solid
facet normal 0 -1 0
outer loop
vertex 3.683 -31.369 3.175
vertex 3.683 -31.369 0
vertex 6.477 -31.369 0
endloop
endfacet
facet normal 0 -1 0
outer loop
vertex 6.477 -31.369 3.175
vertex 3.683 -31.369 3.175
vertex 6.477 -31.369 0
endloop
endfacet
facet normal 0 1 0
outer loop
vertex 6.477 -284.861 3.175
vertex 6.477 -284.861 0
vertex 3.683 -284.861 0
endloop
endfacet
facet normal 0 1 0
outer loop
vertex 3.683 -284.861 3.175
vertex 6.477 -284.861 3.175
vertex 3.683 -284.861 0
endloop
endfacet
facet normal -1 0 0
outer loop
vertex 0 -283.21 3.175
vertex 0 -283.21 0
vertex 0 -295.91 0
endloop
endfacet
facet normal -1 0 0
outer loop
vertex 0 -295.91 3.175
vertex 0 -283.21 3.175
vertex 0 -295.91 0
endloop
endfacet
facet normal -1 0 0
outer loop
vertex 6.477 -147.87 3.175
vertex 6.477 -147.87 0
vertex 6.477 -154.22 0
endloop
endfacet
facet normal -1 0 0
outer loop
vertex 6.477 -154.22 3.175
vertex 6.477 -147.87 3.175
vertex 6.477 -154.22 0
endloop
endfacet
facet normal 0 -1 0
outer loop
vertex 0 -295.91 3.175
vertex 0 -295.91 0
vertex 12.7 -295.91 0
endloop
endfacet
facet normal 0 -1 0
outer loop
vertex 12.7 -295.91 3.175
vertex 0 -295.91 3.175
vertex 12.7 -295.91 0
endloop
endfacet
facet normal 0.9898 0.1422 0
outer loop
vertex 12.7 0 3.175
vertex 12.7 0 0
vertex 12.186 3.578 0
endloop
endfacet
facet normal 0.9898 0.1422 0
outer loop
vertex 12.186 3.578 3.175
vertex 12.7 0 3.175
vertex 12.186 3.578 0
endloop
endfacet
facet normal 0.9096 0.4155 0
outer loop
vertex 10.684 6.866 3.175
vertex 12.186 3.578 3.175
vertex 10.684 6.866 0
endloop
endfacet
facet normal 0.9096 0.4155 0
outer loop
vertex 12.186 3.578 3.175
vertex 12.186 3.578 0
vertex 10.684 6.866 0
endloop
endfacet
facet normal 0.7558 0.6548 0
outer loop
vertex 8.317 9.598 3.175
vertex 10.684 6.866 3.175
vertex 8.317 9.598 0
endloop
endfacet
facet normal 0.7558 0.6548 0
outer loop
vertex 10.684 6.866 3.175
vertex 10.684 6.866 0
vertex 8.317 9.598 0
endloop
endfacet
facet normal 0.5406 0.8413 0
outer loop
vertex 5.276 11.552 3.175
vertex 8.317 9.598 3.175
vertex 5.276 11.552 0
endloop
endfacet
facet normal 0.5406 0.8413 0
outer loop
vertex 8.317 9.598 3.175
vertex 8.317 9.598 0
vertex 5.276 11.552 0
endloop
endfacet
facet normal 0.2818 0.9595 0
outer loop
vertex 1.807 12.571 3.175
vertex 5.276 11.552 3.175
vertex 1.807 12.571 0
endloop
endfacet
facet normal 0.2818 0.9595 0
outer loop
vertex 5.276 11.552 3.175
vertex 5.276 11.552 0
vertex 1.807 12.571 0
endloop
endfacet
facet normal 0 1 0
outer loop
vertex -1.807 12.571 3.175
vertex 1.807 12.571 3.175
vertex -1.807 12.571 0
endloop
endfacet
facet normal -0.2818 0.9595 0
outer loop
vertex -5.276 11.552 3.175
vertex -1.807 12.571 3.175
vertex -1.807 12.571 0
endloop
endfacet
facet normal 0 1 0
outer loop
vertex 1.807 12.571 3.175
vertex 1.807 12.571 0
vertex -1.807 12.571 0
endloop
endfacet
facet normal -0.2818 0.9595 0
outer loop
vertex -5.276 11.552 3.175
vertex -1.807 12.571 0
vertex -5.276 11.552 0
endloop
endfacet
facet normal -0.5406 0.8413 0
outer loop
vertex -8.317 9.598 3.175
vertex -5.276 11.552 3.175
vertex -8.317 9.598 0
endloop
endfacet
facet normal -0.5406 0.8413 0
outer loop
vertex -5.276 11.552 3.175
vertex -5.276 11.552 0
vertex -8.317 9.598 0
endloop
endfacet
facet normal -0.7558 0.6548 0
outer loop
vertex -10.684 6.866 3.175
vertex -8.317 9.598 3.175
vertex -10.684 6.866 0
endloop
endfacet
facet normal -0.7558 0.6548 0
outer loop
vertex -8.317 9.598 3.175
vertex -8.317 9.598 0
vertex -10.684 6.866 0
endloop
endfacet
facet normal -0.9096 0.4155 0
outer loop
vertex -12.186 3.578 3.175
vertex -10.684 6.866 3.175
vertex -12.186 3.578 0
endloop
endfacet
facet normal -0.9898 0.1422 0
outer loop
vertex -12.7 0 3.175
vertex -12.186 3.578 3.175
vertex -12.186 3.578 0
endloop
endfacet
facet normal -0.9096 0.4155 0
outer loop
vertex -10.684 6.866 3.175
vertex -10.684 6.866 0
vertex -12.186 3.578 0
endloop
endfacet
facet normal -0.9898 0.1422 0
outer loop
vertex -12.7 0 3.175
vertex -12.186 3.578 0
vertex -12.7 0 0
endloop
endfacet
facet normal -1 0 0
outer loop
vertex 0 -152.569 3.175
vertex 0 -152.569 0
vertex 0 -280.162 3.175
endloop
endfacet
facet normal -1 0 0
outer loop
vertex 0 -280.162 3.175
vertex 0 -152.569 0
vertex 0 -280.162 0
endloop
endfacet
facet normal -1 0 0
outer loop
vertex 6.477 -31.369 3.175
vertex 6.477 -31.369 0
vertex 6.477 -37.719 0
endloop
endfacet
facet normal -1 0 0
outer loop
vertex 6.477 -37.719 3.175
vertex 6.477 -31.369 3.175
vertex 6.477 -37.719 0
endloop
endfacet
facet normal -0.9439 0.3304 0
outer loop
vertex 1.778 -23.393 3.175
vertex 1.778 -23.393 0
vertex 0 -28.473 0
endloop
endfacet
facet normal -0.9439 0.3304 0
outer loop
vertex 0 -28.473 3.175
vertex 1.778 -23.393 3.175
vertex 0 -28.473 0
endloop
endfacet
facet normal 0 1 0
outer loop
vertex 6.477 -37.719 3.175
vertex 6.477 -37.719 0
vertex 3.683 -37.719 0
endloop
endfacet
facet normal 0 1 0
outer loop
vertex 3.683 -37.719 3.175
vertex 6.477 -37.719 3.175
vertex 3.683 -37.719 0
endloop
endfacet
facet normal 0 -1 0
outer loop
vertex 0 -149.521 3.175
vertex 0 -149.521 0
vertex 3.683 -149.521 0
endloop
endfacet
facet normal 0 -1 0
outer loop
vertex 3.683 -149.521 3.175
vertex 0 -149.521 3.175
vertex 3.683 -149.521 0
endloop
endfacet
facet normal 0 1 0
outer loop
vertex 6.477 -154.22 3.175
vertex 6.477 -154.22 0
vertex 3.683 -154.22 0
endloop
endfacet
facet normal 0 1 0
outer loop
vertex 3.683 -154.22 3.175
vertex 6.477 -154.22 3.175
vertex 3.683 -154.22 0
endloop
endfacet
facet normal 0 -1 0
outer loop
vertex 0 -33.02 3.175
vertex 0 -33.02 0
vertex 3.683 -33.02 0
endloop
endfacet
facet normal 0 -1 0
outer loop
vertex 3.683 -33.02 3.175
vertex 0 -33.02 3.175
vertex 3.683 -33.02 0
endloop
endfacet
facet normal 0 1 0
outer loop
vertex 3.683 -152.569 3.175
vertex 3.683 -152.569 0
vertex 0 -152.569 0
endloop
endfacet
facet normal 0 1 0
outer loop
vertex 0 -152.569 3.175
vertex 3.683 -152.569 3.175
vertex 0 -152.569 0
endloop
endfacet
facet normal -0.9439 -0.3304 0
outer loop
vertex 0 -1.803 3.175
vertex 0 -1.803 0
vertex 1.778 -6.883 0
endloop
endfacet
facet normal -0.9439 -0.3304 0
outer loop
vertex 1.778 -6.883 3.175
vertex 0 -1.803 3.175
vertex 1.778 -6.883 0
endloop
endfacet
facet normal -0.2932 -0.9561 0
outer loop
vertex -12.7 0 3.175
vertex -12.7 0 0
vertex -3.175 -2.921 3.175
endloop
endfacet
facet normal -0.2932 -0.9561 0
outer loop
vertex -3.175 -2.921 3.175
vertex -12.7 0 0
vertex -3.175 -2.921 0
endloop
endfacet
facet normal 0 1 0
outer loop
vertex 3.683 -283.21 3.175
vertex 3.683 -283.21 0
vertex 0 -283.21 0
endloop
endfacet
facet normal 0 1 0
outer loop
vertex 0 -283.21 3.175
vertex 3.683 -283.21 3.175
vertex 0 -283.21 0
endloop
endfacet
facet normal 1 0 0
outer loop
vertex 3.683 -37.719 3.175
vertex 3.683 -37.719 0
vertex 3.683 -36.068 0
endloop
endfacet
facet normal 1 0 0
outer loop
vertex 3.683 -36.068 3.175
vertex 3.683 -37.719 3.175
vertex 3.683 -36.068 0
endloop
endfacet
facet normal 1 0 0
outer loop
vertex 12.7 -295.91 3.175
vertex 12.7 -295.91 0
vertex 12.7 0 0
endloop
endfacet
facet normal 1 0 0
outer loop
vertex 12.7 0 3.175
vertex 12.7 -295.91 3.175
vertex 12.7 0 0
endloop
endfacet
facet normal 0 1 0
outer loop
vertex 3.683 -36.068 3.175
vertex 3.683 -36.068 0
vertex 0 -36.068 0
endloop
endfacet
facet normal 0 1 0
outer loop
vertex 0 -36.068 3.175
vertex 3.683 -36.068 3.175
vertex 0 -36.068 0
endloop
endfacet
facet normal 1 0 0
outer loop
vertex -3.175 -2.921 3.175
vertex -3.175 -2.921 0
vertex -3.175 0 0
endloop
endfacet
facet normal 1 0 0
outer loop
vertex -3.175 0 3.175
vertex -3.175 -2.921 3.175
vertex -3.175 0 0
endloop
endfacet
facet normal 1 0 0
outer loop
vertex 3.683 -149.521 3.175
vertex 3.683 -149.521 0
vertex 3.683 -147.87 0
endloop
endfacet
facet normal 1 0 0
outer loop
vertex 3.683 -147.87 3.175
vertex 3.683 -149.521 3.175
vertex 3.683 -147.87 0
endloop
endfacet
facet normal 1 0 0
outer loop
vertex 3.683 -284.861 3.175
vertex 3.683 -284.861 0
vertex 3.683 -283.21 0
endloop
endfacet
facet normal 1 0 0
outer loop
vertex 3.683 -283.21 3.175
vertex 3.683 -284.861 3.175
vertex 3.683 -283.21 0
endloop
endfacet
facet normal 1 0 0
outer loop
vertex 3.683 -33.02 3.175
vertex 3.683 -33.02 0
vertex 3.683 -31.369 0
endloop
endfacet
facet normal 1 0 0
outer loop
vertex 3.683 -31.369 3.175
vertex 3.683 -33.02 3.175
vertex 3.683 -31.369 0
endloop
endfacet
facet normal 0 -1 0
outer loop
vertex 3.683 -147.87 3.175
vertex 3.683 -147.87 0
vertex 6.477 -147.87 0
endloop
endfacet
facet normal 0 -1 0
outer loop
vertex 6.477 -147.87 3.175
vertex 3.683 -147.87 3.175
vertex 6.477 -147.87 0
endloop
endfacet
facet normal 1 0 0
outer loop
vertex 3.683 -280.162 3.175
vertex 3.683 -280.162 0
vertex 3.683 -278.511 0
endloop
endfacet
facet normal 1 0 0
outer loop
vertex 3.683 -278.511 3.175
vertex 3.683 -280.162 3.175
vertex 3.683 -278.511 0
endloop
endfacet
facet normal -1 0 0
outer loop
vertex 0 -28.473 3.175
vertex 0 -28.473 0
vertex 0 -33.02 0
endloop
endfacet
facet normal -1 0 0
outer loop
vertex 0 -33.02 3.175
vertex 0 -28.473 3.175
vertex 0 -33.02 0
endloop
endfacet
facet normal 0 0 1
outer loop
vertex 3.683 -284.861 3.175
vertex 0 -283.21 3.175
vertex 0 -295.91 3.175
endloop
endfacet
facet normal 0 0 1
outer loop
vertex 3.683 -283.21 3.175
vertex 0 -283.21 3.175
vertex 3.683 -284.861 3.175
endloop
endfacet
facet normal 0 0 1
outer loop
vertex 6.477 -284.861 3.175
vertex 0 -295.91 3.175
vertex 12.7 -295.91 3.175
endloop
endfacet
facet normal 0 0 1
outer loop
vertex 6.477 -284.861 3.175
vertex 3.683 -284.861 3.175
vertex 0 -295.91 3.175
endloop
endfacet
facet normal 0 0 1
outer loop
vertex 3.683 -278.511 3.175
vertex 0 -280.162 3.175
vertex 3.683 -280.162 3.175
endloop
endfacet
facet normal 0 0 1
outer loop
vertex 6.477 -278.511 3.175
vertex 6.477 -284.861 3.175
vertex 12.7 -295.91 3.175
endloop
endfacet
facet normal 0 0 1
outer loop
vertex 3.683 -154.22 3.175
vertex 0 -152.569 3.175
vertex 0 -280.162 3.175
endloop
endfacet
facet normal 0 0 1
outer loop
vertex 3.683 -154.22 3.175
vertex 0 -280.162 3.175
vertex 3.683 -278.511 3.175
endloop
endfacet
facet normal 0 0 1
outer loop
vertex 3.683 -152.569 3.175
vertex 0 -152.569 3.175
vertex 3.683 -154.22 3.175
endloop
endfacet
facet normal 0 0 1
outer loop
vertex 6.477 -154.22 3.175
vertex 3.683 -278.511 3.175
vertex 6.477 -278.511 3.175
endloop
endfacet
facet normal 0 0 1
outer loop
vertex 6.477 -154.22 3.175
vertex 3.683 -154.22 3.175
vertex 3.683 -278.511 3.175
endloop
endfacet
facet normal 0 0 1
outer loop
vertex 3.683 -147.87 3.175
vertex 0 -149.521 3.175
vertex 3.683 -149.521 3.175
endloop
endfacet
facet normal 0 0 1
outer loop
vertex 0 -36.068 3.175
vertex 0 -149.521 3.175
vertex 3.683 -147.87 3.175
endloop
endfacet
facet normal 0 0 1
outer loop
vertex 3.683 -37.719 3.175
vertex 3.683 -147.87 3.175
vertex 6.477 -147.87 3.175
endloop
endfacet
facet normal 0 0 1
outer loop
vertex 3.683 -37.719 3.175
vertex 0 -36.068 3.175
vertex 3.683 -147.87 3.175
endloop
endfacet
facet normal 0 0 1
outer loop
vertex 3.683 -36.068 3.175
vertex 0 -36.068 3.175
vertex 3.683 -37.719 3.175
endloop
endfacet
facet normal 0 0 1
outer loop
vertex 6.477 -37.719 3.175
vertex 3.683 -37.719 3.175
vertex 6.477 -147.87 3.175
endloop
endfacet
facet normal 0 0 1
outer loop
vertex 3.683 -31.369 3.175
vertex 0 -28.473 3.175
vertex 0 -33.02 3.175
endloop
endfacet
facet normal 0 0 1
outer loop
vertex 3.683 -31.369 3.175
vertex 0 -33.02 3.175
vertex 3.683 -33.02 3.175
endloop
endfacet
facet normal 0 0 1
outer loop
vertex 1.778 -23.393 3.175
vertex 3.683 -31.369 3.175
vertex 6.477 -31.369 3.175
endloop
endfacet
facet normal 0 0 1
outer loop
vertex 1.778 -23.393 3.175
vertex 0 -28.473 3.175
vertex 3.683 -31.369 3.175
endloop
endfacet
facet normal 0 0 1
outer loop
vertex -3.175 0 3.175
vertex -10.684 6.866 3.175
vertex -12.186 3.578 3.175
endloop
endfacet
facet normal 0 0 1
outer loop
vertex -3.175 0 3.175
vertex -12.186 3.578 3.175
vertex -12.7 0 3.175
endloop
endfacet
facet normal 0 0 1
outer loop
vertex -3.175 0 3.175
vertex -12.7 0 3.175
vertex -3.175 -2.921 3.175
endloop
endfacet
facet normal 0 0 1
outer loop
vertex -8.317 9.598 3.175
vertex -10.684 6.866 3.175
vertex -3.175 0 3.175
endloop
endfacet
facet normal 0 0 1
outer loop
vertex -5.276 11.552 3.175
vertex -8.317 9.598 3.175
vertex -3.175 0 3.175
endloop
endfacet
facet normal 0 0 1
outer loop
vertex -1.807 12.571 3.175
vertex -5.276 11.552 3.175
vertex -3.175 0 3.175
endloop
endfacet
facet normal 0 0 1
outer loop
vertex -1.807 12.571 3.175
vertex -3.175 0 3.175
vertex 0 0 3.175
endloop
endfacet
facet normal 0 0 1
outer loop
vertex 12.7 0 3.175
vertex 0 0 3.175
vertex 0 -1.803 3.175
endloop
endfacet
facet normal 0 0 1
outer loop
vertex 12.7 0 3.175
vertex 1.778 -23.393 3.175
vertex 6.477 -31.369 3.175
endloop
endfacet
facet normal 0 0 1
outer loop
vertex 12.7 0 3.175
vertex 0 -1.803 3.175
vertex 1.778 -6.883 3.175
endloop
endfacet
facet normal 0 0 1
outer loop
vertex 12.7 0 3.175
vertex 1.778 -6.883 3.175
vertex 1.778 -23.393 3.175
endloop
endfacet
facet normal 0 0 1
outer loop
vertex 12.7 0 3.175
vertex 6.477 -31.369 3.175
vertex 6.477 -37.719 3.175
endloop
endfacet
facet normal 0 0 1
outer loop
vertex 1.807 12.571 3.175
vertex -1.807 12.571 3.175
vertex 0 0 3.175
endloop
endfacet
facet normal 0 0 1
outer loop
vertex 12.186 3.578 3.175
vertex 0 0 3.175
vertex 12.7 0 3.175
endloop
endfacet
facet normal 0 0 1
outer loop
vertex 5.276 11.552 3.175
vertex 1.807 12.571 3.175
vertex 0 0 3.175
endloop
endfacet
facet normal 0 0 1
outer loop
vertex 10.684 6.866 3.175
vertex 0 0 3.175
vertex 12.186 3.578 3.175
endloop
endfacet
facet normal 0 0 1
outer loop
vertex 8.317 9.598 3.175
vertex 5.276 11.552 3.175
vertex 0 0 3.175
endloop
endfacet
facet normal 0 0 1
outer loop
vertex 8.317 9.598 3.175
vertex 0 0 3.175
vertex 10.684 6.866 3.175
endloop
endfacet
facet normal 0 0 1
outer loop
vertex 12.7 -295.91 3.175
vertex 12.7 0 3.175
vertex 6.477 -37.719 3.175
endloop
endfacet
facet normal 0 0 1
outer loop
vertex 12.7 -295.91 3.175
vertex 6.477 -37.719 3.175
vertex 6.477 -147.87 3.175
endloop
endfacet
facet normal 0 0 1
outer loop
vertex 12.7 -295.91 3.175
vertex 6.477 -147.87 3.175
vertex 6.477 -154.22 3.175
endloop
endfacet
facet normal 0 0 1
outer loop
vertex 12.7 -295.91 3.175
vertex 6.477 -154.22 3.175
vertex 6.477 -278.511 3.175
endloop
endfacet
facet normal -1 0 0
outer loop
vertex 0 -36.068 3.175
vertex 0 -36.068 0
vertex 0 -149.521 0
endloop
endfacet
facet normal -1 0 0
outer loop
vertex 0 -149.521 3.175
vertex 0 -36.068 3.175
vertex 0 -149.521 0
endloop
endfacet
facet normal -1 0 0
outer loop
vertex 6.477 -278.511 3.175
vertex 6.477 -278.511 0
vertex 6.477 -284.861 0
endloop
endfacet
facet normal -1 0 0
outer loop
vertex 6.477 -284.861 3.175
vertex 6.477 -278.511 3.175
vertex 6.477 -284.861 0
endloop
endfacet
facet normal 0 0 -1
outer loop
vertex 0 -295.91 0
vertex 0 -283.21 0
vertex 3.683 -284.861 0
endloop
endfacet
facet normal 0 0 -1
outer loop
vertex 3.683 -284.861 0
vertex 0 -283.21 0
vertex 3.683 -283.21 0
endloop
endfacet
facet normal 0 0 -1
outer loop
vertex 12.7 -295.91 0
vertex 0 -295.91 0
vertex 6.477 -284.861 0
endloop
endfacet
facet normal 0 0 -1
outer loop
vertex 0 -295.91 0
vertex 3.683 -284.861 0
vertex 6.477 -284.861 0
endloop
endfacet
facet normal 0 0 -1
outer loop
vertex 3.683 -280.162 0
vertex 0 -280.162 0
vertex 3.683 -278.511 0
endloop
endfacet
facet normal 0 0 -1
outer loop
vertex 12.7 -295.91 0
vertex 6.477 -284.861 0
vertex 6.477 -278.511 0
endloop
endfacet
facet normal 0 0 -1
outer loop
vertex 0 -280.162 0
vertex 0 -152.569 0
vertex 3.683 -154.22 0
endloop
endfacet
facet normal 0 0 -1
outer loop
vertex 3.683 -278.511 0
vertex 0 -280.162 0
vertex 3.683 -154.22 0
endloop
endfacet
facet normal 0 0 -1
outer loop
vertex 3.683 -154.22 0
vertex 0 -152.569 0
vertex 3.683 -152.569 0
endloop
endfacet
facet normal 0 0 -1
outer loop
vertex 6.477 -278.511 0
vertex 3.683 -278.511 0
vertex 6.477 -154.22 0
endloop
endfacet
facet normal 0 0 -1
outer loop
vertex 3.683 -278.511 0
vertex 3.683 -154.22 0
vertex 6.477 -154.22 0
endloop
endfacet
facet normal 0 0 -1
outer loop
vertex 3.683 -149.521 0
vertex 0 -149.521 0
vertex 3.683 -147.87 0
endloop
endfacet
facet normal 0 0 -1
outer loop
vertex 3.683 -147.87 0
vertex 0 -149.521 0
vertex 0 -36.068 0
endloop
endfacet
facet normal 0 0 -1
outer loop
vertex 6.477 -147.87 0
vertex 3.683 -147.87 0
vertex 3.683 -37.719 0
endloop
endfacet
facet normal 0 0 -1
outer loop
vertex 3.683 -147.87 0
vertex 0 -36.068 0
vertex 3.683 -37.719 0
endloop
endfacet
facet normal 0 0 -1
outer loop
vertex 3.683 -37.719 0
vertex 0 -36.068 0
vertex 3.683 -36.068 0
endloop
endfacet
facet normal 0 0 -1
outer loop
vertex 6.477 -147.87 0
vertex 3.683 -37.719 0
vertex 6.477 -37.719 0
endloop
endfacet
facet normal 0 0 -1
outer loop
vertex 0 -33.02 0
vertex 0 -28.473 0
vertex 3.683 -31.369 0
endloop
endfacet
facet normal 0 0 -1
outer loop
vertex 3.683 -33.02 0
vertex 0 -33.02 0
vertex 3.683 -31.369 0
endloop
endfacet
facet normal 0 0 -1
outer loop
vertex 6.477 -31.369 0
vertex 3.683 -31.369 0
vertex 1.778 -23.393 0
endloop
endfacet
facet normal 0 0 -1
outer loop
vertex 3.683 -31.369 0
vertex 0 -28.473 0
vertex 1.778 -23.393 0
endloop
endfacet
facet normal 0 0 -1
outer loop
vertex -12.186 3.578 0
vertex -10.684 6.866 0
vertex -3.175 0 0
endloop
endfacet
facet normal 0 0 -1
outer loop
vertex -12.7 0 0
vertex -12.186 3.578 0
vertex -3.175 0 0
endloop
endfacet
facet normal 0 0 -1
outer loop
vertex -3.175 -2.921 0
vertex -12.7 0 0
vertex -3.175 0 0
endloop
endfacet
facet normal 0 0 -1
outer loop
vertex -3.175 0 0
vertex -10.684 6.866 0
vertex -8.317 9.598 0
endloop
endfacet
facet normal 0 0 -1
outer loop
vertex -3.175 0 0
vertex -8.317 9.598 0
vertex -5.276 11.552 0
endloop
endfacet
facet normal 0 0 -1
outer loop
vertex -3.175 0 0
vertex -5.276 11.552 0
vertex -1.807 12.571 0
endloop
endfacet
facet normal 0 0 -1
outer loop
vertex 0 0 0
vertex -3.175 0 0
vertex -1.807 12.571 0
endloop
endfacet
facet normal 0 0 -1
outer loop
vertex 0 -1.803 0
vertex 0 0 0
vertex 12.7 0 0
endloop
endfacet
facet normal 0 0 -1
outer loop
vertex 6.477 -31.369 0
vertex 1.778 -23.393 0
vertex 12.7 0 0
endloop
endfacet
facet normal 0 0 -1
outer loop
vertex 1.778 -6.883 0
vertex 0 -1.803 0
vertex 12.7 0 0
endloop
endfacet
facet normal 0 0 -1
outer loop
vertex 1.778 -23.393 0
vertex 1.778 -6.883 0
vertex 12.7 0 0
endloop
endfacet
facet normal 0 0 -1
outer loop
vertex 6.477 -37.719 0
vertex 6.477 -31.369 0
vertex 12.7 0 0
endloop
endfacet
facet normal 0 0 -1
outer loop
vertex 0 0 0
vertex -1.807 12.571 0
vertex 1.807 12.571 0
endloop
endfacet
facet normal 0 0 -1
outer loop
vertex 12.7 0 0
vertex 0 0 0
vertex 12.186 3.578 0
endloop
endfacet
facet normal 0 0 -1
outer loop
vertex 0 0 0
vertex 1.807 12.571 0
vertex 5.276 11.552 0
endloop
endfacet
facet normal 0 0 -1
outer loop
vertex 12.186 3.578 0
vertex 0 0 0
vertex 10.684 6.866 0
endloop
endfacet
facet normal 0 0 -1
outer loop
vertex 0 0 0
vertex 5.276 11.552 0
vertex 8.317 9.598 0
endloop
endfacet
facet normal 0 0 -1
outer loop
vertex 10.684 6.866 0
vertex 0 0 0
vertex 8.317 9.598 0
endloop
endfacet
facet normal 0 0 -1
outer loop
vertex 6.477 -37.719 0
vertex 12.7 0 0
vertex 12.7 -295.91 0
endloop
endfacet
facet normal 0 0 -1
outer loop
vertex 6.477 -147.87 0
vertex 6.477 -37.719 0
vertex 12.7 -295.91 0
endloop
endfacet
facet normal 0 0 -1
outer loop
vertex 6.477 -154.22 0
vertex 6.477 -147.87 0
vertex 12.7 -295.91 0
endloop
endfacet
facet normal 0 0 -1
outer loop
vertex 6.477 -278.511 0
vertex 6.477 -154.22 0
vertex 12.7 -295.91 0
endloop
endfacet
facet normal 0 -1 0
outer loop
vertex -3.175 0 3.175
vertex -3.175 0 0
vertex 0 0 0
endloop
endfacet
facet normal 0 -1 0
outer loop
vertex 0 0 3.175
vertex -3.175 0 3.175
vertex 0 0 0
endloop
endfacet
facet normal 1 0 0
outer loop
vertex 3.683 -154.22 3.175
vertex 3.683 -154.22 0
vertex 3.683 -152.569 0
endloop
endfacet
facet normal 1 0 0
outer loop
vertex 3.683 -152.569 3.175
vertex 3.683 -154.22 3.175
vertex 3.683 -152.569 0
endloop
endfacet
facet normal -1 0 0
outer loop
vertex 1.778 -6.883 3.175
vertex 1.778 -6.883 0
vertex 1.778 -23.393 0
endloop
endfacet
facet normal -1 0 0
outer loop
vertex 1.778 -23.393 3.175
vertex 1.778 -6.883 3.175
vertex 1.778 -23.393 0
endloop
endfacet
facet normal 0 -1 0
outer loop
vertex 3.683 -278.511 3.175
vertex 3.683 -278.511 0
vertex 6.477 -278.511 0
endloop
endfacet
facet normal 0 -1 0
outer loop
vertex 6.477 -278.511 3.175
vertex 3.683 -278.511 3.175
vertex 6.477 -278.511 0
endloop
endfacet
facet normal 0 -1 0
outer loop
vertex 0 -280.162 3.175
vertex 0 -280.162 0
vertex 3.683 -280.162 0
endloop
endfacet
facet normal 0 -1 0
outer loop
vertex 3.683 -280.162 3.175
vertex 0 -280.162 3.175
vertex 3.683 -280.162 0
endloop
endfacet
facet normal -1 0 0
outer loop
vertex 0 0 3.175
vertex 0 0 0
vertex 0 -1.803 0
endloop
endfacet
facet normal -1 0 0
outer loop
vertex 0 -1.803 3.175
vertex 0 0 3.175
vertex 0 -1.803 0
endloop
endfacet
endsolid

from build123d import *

# Parameters (mm, degrees)
BOSS_EXTRUDE1_DEPTH = 3.175


with BuildPart() as part:
    # Sketch1 → Boss-Extrude1 (new body)
    with BuildSketch(Plane.XY):
        with BuildLine():
            Line((0, 0), (0, -1.8034))
            Line((0, -1.8034), (1.778, -6.8834))
            Line((1.778, -6.8834), (1.778, -23.3934))
            Line((1.778, -23.3934), (0, -28.4734))
            Line((0, -28.4734), (0, -33.02))
            Line((0, -33.02), (3.683, -33.02))
            Line((3.683, -33.02), (3.683, -31.369))
            Line((3.683, -31.369), (6.477, -31.369))
            Line((6.477, -31.369), (6.477, -37.719))
            Line((6.477, -37.719), (3.683, -37.719))
            Line((3.683, -37.719), (3.683, -36.068))
            Line((3.683, -36.068), (0, -36.068))
            Line((0, -36.068), (0, -149.521333333))
            Line((0, -149.521333333), (3.683, -149.521333333))
            Line((3.683, -149.521333333), (3.683, -147.870333333))
            Line((3.683, -147.870333333), (6.477, -147.870333333))
            Line((6.477, -147.870333333), (6.477, -154.220333333))
            Line((6.477, -154.220333333), (3.683, -154.220333333))
            Line((3.683, -154.220333333), (3.683, -152.569333333))
            Line((3.683, -152.569333333), (0, -152.569333333))
            Line((0, -152.569333333), (0, -280.162))
            Line((0, -280.162), (3.683, -280.162))
            Line((3.683, -280.162), (3.683, -278.511))
            Line((3.683, -278.511), (6.477, -278.511))
            Line((6.477, -278.511), (6.477, -284.861))
            Line((6.477, -284.861), (3.683, -284.861))
            Line((3.683, -284.861), (3.683, -283.21))
            Line((3.683, -283.21), (0, -283.21))
            Line((0, -283.21), (0, -295.91))
            Line((0, -295.91), (12.7, -295.91))
            Line((12.7, -295.91), (12.7, 0))
            ThreePointArc((12.7, 0), (0, 12.7), (-12.7, 0))
            Line((-12.7, 0), (-3.175, -2.921))
            Line((-3.175, -2.921), (-3.175, 0))
            Line((-3.175, 0), (0, 0))
        make_face()
    extrude(amount=BOSS_EXTRUDE1_DEPTH)


solid = part.part
